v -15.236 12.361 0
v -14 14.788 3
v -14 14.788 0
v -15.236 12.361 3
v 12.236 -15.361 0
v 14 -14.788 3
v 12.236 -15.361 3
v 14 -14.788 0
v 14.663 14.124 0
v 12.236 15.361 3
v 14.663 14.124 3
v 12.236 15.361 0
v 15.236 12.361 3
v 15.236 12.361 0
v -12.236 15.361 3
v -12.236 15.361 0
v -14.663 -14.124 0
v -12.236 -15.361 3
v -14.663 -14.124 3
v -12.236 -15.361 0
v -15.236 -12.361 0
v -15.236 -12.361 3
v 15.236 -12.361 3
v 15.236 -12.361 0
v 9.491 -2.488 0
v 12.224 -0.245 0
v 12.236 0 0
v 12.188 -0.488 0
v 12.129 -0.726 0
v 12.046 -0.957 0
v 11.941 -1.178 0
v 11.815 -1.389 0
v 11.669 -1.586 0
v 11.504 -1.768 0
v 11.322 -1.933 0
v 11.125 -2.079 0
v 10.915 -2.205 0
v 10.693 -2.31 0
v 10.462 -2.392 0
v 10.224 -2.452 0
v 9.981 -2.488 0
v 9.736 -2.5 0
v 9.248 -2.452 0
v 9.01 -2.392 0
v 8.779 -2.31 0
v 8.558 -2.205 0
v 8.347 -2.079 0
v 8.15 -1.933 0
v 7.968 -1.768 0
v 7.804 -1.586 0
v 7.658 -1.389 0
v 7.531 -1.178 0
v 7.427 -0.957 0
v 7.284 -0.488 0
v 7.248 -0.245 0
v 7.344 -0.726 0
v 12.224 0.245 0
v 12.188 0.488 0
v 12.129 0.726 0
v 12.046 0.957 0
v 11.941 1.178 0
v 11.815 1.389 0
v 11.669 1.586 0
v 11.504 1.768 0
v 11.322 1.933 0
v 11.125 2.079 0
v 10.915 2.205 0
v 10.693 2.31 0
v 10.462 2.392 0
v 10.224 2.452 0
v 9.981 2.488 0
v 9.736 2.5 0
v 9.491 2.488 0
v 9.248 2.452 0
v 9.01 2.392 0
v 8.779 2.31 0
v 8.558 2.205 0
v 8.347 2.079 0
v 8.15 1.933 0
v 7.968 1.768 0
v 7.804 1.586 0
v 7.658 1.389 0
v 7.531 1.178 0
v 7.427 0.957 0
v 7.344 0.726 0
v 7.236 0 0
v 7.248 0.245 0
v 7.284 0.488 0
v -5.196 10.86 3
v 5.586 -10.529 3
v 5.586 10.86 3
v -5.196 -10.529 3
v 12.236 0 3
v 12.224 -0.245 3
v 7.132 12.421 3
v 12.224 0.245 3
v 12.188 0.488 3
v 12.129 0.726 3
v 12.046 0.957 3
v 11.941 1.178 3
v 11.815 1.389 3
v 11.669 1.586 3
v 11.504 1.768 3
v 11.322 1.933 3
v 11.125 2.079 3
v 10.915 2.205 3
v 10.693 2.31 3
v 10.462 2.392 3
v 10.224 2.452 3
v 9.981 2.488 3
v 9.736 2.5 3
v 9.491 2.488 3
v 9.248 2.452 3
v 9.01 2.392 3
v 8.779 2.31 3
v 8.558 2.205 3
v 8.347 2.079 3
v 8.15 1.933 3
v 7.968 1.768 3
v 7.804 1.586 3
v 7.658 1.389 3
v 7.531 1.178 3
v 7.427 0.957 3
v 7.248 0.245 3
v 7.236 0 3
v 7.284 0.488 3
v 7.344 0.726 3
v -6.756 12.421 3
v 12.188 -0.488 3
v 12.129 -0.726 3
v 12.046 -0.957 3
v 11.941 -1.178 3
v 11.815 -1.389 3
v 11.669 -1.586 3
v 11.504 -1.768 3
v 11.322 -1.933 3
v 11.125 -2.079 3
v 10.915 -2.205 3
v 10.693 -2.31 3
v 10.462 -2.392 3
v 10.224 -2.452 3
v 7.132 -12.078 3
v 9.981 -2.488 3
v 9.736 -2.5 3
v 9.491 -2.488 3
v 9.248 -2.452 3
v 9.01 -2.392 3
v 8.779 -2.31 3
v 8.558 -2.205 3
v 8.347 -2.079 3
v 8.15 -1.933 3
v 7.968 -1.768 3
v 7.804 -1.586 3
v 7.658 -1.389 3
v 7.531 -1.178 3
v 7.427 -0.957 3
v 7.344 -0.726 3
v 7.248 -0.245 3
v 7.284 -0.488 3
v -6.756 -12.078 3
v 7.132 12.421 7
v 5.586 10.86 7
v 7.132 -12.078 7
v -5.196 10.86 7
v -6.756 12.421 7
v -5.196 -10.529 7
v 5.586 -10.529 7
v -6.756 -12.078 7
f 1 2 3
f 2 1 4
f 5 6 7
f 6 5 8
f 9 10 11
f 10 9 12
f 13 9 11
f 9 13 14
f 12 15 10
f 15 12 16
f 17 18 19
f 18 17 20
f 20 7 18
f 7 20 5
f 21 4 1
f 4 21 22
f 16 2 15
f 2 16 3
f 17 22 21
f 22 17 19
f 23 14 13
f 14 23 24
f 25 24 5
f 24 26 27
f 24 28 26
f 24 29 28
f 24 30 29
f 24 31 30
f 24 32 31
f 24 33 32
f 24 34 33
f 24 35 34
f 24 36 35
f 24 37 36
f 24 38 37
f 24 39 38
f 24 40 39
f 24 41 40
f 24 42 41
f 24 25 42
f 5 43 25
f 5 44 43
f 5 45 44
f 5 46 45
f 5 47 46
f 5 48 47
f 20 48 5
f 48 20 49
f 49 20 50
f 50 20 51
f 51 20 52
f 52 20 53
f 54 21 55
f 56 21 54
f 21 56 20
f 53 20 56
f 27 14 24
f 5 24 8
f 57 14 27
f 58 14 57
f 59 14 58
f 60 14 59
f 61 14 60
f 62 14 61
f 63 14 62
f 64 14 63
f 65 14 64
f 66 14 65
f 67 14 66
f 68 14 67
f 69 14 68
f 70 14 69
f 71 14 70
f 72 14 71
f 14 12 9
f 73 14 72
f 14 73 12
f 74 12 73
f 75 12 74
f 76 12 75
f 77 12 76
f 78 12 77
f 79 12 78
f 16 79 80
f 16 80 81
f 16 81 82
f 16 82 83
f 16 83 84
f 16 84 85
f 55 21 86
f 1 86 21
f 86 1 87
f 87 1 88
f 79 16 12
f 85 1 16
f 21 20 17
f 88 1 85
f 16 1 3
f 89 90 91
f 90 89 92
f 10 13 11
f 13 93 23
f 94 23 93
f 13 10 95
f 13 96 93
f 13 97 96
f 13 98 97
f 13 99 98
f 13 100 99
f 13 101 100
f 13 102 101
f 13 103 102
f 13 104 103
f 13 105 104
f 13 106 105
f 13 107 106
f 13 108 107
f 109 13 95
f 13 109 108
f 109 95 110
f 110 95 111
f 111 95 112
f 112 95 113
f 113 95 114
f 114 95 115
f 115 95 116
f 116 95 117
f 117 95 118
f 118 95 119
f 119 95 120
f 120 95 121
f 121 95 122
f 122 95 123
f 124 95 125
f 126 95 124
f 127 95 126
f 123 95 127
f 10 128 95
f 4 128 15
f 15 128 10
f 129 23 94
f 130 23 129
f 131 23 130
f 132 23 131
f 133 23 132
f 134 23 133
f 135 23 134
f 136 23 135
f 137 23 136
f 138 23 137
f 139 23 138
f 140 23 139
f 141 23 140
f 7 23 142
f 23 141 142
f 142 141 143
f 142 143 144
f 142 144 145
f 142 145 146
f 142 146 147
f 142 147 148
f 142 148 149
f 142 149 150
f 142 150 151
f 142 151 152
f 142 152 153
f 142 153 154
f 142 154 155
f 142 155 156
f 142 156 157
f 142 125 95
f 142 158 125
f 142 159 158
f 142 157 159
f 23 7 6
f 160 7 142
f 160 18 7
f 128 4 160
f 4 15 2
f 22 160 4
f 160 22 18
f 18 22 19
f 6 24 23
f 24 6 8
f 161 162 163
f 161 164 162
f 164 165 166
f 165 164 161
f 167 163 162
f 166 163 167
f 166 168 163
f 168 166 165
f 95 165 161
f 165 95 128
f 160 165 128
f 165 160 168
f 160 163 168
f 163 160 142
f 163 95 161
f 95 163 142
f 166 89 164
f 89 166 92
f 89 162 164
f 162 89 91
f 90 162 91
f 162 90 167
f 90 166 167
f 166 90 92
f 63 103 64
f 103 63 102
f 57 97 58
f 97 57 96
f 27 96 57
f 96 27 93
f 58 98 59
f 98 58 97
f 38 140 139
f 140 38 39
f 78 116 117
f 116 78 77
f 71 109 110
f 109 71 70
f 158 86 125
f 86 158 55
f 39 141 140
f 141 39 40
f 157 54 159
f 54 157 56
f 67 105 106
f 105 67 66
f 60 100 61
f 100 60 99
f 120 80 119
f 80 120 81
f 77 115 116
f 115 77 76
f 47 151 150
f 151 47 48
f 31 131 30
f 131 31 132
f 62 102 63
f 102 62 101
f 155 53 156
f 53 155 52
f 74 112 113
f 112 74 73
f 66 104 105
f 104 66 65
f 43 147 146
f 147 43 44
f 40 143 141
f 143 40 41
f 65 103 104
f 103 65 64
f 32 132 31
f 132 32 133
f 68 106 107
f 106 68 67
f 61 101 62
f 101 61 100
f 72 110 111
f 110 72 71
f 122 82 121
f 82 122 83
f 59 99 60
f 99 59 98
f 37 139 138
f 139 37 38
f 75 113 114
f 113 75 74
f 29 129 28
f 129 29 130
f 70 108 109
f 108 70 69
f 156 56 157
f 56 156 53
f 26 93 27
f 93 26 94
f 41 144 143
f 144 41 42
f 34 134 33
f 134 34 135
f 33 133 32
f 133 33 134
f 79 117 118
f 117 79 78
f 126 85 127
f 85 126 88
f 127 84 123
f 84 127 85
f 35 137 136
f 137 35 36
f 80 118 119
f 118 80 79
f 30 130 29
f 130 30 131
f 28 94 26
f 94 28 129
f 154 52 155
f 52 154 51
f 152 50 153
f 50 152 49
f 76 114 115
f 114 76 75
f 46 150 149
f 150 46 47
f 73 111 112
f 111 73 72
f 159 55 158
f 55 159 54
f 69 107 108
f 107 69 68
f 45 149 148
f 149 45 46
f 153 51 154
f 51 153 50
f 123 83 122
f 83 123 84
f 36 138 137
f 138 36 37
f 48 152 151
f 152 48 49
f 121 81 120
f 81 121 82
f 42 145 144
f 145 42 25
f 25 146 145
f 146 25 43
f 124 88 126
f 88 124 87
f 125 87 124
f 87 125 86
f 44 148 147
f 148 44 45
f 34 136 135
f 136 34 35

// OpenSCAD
// 由 scripts/make_text3d.py 生成 —— 改完可直接 scad_build.py 重编译
// 文字只在这里写一遍；底板尺寸是脚本量出文字包围盒后算好的明确数字
// 模式：平放
text_str  = "苗";
font_name = "Hiragino Sans GB";
size_mm   = 20.0;
height_mm = 4.0;
base_mm   = 3.0;
pad_mm    = 3.0;
hole_mm   = 5.0;
base_w    = 30.4724;
base_h    = 30.7222;

difference() {
  union() {
  linear_extrude(3.0)
    offset(r = 3) square([24.4724, 24.7222], center = true);
  translate([0, 0, 3.0])
    linear_extrude(4.0)
      text(text_str, size = size_mm, font = font_name, halign = "center", valign = "center");
  }
  translate([9.7362, 0, -1])
    cylinder(d = 5.0, h = 5.0, $fn = 64);
}
